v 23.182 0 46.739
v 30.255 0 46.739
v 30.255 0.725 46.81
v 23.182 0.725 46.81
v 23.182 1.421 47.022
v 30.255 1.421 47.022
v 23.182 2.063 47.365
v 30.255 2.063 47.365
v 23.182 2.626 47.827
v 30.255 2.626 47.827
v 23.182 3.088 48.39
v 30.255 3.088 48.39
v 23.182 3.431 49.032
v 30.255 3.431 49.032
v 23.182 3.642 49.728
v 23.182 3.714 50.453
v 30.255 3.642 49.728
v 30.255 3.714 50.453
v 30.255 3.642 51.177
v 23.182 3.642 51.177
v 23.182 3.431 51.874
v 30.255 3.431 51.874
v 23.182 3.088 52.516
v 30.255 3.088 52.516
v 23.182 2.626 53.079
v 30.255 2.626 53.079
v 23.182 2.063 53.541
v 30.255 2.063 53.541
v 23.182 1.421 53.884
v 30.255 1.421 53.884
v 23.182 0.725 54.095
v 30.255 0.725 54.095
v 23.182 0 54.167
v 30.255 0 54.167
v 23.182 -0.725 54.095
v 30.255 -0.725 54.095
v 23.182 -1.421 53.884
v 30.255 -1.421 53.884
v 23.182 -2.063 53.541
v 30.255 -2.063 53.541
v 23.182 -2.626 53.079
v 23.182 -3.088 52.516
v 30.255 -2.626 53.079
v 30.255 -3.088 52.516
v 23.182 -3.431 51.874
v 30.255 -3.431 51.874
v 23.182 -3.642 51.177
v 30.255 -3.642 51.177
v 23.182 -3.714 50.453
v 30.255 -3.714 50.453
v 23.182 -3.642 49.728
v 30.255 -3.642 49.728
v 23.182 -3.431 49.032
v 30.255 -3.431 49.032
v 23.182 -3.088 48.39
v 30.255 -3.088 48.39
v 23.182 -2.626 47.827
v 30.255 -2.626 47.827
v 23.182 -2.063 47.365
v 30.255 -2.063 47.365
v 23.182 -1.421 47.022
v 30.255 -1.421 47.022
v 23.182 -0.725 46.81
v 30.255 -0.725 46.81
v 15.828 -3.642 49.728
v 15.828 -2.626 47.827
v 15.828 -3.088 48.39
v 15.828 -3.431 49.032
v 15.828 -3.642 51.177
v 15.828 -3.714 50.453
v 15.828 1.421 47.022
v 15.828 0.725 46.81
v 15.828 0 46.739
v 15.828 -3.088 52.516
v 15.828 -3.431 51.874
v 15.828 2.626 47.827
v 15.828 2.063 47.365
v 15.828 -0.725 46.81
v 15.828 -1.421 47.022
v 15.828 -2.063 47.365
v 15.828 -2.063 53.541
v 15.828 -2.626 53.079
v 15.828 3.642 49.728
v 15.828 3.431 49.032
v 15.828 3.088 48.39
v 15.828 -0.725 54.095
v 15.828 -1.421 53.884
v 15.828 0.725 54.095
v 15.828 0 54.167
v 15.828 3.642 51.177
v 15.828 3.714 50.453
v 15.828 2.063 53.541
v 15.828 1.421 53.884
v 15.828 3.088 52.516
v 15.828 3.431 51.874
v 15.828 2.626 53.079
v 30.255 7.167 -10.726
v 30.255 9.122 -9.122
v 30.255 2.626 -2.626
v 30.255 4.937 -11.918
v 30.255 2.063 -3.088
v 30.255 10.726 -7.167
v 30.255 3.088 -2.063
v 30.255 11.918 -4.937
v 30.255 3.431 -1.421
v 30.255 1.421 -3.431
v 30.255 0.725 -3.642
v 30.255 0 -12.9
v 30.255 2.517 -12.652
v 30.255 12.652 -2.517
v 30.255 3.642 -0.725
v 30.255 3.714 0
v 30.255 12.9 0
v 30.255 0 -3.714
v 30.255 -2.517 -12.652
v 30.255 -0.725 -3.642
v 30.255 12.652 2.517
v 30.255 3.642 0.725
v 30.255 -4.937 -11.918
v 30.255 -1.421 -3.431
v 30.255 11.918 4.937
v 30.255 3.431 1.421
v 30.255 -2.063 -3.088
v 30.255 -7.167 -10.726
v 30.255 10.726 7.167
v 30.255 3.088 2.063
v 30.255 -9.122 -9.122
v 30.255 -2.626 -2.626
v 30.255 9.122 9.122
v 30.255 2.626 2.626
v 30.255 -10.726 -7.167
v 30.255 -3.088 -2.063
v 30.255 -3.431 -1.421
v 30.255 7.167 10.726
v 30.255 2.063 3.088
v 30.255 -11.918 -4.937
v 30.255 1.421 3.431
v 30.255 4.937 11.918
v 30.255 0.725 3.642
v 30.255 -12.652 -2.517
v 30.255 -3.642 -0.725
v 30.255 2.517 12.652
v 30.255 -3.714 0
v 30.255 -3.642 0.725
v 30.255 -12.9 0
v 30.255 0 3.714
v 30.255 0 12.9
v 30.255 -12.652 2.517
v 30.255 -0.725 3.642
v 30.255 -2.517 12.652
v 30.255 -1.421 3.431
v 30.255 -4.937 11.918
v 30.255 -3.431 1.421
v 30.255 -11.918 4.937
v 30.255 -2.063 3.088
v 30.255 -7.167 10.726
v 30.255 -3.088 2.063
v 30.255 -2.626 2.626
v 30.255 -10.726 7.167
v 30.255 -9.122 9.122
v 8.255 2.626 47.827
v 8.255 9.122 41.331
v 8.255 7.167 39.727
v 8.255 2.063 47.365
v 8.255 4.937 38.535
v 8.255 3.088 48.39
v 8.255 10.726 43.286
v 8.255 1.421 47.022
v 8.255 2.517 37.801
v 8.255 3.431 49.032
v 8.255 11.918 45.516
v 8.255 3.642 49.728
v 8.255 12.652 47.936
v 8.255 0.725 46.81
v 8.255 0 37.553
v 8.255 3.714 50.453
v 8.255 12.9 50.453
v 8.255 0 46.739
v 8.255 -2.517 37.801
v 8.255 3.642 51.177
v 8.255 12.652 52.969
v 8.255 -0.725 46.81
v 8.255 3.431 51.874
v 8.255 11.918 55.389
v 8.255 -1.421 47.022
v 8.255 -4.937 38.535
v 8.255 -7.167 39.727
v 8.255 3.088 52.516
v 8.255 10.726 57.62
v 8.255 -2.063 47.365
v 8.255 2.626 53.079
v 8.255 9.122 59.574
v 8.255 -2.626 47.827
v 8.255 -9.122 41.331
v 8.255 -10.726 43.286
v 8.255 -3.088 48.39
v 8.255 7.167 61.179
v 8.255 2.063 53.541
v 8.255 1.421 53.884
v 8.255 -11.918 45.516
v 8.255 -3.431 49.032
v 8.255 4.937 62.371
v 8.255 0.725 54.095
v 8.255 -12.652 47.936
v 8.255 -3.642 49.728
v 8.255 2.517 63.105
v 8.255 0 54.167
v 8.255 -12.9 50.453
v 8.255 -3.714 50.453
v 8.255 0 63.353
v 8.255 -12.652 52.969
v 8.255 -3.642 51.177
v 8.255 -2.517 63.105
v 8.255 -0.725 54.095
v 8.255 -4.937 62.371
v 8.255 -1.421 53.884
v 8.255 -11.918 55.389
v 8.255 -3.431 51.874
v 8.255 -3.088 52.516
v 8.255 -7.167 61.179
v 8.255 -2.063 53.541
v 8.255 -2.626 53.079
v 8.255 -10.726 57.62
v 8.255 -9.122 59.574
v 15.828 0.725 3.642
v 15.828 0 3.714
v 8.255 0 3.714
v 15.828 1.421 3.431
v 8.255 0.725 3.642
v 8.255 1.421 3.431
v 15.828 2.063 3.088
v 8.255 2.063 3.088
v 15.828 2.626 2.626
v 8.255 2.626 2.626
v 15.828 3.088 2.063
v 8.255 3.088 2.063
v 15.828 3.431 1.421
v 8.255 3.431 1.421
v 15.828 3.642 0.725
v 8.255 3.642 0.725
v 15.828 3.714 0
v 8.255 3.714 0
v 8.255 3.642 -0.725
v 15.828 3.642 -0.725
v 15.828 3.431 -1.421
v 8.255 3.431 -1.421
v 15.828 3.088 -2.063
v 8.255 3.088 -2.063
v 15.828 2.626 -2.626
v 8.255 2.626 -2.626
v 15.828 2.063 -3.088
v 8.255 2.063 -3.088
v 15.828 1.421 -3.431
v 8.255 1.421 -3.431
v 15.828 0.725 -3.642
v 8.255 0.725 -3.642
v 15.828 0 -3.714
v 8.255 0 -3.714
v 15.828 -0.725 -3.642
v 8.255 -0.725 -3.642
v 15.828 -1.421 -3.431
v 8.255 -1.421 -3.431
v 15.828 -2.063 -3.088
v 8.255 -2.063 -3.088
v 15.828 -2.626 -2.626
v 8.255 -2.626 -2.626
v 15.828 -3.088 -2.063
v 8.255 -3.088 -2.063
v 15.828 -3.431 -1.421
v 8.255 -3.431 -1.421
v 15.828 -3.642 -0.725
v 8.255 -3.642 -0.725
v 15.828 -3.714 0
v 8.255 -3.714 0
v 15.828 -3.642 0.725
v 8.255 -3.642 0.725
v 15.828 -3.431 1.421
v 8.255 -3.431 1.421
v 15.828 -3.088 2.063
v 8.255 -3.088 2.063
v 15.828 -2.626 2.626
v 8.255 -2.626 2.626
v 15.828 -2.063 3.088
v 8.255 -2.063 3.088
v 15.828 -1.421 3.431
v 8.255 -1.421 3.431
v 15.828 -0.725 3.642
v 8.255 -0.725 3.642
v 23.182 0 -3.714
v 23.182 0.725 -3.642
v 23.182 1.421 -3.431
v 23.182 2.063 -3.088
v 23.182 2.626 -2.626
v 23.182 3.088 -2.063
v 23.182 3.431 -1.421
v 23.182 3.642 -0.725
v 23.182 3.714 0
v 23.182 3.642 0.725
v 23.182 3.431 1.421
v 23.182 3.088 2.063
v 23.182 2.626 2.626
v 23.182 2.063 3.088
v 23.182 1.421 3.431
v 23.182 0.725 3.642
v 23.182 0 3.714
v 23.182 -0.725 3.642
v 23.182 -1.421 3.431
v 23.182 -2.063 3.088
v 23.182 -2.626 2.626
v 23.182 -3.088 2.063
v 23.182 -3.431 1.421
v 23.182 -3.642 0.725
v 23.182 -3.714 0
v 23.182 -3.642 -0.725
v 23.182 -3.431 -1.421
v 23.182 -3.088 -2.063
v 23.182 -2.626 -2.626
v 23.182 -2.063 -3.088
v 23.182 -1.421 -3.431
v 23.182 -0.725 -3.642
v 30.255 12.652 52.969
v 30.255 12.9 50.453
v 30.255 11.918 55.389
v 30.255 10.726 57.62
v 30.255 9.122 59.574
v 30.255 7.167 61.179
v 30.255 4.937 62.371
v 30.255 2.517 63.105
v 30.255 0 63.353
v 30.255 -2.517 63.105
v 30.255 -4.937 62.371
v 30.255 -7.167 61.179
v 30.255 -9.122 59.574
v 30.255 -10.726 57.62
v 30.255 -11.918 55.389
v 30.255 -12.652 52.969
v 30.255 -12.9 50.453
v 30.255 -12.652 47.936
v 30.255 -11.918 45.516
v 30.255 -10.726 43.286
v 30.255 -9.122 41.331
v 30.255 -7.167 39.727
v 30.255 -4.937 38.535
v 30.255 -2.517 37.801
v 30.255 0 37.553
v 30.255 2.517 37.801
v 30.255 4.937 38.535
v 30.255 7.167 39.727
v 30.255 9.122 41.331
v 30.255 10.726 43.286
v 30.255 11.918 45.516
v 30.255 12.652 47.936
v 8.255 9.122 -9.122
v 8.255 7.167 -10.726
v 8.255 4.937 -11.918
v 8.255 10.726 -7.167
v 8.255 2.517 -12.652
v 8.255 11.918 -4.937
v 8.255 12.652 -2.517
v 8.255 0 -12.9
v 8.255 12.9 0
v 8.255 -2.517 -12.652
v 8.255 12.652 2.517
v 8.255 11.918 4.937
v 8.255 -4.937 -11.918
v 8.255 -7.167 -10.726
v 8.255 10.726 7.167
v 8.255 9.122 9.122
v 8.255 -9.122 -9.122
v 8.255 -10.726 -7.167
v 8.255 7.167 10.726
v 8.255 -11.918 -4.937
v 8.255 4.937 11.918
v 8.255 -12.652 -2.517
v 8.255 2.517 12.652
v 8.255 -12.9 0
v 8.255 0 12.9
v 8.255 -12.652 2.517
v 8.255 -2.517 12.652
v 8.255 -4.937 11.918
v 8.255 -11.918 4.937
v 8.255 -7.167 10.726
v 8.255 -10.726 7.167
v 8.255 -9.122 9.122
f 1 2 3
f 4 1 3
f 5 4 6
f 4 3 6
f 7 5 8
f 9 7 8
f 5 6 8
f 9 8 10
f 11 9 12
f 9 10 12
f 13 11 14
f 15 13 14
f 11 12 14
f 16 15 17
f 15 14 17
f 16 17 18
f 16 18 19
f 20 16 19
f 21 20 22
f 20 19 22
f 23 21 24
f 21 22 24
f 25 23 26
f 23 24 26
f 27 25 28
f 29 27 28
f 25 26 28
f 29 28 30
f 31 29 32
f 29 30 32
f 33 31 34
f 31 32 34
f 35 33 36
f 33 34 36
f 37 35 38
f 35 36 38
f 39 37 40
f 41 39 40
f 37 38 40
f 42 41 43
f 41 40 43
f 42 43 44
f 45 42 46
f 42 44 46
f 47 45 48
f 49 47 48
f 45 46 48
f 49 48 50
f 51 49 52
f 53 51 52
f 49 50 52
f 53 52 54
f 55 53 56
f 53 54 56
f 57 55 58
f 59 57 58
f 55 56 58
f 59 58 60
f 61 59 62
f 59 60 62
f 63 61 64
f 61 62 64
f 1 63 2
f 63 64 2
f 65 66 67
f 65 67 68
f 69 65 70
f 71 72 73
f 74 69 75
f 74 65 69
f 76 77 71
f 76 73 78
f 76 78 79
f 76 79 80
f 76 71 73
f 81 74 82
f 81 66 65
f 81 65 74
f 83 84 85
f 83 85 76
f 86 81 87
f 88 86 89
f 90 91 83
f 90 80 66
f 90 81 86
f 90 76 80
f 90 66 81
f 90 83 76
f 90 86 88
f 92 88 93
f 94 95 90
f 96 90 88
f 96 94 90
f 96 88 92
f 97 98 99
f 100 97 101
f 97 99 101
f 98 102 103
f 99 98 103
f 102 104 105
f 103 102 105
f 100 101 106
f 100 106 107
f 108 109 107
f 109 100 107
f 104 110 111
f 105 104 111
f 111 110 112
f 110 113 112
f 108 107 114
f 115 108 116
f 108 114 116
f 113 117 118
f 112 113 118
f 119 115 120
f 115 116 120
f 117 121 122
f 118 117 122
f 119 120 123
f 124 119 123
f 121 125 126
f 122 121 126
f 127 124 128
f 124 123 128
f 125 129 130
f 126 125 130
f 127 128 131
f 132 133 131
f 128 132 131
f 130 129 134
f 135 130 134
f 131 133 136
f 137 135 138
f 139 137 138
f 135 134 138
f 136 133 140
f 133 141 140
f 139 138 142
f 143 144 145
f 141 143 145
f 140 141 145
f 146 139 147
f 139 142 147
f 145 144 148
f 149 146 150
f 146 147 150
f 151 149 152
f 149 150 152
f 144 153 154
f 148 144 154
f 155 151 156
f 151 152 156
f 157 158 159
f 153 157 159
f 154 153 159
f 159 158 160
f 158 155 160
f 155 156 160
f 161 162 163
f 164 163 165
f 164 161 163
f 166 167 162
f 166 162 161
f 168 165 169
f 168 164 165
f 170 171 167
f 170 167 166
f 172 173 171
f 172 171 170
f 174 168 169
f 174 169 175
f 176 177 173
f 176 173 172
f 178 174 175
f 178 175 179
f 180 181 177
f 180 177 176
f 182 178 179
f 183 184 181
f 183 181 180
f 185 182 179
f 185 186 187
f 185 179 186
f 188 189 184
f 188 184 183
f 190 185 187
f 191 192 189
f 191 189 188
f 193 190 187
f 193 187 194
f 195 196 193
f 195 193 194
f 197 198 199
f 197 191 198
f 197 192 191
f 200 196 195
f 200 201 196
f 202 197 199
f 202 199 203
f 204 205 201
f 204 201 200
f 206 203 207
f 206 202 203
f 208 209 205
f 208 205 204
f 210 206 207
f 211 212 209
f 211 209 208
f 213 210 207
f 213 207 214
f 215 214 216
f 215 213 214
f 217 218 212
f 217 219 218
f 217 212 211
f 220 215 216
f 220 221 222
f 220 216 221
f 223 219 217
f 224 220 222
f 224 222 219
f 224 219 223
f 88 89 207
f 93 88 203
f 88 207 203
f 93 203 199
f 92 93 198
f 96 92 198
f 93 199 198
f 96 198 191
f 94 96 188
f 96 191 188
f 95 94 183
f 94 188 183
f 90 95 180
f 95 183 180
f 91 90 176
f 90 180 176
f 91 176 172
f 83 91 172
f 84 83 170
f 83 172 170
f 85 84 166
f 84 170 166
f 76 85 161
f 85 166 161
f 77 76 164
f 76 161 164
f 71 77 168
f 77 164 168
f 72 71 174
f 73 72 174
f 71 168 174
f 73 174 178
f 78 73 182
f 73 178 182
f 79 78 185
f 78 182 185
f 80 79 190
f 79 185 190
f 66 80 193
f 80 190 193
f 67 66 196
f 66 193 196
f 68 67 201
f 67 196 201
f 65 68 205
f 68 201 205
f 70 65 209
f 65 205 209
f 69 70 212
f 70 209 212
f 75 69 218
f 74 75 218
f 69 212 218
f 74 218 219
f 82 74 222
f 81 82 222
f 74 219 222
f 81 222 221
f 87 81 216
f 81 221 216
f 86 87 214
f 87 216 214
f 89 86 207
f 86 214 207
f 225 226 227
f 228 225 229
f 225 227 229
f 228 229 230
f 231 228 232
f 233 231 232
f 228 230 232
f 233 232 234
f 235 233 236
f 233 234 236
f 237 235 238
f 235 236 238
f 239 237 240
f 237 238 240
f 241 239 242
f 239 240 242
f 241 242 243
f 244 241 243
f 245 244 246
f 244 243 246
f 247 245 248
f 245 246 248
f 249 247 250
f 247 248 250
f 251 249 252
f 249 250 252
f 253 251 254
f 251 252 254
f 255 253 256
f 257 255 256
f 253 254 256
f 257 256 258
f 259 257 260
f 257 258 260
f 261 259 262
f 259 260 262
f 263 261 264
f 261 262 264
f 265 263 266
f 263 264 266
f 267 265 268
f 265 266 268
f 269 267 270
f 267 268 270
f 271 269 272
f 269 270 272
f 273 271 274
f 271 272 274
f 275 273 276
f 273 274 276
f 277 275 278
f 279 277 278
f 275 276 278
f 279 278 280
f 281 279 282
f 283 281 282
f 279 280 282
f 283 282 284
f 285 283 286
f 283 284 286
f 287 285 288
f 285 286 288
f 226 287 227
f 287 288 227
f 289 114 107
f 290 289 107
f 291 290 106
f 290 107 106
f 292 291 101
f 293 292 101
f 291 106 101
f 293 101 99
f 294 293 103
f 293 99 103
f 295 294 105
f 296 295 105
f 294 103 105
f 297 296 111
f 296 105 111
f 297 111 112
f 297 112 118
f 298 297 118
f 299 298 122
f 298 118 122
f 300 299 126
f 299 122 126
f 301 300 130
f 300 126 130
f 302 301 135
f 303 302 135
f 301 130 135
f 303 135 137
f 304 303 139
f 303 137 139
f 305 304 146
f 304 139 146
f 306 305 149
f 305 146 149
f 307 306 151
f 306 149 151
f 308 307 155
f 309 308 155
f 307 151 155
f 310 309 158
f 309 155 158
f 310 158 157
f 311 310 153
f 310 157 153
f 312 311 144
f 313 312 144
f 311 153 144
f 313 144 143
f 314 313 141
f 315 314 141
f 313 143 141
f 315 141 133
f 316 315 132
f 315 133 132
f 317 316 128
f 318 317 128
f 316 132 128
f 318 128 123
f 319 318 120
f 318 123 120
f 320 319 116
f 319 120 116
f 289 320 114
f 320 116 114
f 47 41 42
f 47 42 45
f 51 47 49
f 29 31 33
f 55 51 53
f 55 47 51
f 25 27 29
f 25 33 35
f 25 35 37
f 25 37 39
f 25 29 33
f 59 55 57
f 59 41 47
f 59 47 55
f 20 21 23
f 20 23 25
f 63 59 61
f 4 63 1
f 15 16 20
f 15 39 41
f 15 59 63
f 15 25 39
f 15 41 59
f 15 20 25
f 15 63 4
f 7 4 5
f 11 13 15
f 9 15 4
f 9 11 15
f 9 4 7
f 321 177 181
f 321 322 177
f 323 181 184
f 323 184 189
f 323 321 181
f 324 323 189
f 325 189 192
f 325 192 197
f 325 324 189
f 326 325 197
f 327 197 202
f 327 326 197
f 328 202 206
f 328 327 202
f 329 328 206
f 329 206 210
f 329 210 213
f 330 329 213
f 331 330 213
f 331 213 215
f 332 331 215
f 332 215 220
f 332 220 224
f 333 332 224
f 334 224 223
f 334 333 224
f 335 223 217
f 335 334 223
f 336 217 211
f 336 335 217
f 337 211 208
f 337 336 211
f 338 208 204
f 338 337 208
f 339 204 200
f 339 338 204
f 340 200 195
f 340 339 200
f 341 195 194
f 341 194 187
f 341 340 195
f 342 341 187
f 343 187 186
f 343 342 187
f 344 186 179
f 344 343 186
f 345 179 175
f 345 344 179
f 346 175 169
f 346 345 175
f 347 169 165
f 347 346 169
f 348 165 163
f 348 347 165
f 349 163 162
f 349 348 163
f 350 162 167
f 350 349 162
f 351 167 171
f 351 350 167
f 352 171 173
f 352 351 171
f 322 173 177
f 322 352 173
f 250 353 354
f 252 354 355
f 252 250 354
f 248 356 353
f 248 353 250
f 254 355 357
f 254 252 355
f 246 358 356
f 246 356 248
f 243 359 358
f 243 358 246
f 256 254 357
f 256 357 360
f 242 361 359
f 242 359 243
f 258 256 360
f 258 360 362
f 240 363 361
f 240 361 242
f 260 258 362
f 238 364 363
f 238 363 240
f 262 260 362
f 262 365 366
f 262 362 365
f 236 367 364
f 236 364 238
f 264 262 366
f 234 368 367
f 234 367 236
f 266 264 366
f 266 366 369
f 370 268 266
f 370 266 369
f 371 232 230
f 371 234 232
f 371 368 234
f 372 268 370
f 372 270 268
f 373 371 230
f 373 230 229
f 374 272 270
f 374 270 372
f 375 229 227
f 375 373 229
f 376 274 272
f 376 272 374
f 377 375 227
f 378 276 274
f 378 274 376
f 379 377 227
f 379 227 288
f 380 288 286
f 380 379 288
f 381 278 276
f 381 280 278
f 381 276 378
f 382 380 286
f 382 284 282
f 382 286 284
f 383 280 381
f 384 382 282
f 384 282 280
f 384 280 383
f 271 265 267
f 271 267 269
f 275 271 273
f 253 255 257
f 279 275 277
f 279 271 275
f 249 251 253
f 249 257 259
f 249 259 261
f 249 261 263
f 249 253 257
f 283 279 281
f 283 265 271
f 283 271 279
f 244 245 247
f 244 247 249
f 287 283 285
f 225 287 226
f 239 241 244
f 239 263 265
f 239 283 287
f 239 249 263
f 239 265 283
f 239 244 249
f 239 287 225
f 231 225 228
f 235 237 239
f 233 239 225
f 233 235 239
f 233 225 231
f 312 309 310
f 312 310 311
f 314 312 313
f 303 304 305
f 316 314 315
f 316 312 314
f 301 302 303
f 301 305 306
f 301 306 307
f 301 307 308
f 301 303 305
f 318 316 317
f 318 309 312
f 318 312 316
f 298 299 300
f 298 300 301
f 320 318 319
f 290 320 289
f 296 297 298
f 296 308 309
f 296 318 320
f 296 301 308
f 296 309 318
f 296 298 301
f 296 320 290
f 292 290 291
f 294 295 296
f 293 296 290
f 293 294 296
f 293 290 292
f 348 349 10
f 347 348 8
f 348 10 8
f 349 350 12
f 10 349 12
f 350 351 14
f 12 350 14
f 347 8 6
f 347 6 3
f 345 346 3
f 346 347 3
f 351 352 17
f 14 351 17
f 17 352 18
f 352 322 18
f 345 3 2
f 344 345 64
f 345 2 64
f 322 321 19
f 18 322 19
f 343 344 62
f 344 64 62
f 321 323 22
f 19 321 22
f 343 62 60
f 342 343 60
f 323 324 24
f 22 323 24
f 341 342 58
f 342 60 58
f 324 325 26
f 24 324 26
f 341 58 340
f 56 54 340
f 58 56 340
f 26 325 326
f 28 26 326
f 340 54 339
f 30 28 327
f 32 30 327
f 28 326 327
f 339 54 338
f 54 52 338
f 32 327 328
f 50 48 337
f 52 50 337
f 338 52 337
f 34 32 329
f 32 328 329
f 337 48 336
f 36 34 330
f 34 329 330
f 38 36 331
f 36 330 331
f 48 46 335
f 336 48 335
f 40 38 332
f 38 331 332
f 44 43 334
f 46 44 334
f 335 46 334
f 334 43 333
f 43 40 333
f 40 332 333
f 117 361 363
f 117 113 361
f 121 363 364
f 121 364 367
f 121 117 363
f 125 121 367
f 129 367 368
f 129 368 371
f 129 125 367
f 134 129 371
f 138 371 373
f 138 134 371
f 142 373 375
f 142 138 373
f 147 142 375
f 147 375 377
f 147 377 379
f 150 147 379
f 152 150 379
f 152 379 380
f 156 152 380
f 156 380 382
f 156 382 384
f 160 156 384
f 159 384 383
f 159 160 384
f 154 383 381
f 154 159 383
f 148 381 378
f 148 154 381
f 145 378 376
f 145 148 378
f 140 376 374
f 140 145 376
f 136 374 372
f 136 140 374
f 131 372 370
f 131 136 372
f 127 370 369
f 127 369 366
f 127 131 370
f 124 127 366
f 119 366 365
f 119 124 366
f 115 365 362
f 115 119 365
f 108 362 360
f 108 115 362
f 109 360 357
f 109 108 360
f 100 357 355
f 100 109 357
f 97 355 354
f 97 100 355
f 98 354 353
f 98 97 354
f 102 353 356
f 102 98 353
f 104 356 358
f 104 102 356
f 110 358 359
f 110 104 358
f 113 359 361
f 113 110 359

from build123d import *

# Parameters (mm, degrees)
SKETCH1_W          = 22
SKETCH1_H          = 12.9
SKETCH2_R          = 3.71375
CUT_EXTRUDE1_DEPTH = 7.5725
SKETCH4_R          = 3.71375
CUT_EXTRUDE2_DEPTH = 7.0725


with BuildPart() as part:
    # Sketch1 → Revolve1 (revolve)
    with BuildSketch(Plane.XY):
        with Locations((19.255, 6.45)):
            Rectangle(SKETCH1_W, SKETCH1_H)
    revolve(axis=Axis((8.255, 0, 0), (1, 0, 0)))

    # Sketch2 → Cut-Extrude1 (cut)
    with BuildSketch(Plane.ZY.offset(-8.255)):
        Circle(SKETCH2_R)
    extrude(amount=-CUT_EXTRUDE1_DEPTH, mode=Mode.SUBTRACT)

    # Sketch4 → Cut-Extrude2 (cut)
    with BuildSketch(Plane(origin=(30.255, 0, 0), x_dir=(0, 0, -1), z_dir=(1, 0, 0))):
        Circle(SKETCH4_R)
    extrude(amount=-CUT_EXTRUDE2_DEPTH, mode=Mode.SUBTRACT)


with BuildPart() as body_2:
    # Body-Move/Copy1: copy of part
    add(part.part.moved(Location((0, 0, 50.452769062))))


solid = Compound([part.part, body_2.part])
